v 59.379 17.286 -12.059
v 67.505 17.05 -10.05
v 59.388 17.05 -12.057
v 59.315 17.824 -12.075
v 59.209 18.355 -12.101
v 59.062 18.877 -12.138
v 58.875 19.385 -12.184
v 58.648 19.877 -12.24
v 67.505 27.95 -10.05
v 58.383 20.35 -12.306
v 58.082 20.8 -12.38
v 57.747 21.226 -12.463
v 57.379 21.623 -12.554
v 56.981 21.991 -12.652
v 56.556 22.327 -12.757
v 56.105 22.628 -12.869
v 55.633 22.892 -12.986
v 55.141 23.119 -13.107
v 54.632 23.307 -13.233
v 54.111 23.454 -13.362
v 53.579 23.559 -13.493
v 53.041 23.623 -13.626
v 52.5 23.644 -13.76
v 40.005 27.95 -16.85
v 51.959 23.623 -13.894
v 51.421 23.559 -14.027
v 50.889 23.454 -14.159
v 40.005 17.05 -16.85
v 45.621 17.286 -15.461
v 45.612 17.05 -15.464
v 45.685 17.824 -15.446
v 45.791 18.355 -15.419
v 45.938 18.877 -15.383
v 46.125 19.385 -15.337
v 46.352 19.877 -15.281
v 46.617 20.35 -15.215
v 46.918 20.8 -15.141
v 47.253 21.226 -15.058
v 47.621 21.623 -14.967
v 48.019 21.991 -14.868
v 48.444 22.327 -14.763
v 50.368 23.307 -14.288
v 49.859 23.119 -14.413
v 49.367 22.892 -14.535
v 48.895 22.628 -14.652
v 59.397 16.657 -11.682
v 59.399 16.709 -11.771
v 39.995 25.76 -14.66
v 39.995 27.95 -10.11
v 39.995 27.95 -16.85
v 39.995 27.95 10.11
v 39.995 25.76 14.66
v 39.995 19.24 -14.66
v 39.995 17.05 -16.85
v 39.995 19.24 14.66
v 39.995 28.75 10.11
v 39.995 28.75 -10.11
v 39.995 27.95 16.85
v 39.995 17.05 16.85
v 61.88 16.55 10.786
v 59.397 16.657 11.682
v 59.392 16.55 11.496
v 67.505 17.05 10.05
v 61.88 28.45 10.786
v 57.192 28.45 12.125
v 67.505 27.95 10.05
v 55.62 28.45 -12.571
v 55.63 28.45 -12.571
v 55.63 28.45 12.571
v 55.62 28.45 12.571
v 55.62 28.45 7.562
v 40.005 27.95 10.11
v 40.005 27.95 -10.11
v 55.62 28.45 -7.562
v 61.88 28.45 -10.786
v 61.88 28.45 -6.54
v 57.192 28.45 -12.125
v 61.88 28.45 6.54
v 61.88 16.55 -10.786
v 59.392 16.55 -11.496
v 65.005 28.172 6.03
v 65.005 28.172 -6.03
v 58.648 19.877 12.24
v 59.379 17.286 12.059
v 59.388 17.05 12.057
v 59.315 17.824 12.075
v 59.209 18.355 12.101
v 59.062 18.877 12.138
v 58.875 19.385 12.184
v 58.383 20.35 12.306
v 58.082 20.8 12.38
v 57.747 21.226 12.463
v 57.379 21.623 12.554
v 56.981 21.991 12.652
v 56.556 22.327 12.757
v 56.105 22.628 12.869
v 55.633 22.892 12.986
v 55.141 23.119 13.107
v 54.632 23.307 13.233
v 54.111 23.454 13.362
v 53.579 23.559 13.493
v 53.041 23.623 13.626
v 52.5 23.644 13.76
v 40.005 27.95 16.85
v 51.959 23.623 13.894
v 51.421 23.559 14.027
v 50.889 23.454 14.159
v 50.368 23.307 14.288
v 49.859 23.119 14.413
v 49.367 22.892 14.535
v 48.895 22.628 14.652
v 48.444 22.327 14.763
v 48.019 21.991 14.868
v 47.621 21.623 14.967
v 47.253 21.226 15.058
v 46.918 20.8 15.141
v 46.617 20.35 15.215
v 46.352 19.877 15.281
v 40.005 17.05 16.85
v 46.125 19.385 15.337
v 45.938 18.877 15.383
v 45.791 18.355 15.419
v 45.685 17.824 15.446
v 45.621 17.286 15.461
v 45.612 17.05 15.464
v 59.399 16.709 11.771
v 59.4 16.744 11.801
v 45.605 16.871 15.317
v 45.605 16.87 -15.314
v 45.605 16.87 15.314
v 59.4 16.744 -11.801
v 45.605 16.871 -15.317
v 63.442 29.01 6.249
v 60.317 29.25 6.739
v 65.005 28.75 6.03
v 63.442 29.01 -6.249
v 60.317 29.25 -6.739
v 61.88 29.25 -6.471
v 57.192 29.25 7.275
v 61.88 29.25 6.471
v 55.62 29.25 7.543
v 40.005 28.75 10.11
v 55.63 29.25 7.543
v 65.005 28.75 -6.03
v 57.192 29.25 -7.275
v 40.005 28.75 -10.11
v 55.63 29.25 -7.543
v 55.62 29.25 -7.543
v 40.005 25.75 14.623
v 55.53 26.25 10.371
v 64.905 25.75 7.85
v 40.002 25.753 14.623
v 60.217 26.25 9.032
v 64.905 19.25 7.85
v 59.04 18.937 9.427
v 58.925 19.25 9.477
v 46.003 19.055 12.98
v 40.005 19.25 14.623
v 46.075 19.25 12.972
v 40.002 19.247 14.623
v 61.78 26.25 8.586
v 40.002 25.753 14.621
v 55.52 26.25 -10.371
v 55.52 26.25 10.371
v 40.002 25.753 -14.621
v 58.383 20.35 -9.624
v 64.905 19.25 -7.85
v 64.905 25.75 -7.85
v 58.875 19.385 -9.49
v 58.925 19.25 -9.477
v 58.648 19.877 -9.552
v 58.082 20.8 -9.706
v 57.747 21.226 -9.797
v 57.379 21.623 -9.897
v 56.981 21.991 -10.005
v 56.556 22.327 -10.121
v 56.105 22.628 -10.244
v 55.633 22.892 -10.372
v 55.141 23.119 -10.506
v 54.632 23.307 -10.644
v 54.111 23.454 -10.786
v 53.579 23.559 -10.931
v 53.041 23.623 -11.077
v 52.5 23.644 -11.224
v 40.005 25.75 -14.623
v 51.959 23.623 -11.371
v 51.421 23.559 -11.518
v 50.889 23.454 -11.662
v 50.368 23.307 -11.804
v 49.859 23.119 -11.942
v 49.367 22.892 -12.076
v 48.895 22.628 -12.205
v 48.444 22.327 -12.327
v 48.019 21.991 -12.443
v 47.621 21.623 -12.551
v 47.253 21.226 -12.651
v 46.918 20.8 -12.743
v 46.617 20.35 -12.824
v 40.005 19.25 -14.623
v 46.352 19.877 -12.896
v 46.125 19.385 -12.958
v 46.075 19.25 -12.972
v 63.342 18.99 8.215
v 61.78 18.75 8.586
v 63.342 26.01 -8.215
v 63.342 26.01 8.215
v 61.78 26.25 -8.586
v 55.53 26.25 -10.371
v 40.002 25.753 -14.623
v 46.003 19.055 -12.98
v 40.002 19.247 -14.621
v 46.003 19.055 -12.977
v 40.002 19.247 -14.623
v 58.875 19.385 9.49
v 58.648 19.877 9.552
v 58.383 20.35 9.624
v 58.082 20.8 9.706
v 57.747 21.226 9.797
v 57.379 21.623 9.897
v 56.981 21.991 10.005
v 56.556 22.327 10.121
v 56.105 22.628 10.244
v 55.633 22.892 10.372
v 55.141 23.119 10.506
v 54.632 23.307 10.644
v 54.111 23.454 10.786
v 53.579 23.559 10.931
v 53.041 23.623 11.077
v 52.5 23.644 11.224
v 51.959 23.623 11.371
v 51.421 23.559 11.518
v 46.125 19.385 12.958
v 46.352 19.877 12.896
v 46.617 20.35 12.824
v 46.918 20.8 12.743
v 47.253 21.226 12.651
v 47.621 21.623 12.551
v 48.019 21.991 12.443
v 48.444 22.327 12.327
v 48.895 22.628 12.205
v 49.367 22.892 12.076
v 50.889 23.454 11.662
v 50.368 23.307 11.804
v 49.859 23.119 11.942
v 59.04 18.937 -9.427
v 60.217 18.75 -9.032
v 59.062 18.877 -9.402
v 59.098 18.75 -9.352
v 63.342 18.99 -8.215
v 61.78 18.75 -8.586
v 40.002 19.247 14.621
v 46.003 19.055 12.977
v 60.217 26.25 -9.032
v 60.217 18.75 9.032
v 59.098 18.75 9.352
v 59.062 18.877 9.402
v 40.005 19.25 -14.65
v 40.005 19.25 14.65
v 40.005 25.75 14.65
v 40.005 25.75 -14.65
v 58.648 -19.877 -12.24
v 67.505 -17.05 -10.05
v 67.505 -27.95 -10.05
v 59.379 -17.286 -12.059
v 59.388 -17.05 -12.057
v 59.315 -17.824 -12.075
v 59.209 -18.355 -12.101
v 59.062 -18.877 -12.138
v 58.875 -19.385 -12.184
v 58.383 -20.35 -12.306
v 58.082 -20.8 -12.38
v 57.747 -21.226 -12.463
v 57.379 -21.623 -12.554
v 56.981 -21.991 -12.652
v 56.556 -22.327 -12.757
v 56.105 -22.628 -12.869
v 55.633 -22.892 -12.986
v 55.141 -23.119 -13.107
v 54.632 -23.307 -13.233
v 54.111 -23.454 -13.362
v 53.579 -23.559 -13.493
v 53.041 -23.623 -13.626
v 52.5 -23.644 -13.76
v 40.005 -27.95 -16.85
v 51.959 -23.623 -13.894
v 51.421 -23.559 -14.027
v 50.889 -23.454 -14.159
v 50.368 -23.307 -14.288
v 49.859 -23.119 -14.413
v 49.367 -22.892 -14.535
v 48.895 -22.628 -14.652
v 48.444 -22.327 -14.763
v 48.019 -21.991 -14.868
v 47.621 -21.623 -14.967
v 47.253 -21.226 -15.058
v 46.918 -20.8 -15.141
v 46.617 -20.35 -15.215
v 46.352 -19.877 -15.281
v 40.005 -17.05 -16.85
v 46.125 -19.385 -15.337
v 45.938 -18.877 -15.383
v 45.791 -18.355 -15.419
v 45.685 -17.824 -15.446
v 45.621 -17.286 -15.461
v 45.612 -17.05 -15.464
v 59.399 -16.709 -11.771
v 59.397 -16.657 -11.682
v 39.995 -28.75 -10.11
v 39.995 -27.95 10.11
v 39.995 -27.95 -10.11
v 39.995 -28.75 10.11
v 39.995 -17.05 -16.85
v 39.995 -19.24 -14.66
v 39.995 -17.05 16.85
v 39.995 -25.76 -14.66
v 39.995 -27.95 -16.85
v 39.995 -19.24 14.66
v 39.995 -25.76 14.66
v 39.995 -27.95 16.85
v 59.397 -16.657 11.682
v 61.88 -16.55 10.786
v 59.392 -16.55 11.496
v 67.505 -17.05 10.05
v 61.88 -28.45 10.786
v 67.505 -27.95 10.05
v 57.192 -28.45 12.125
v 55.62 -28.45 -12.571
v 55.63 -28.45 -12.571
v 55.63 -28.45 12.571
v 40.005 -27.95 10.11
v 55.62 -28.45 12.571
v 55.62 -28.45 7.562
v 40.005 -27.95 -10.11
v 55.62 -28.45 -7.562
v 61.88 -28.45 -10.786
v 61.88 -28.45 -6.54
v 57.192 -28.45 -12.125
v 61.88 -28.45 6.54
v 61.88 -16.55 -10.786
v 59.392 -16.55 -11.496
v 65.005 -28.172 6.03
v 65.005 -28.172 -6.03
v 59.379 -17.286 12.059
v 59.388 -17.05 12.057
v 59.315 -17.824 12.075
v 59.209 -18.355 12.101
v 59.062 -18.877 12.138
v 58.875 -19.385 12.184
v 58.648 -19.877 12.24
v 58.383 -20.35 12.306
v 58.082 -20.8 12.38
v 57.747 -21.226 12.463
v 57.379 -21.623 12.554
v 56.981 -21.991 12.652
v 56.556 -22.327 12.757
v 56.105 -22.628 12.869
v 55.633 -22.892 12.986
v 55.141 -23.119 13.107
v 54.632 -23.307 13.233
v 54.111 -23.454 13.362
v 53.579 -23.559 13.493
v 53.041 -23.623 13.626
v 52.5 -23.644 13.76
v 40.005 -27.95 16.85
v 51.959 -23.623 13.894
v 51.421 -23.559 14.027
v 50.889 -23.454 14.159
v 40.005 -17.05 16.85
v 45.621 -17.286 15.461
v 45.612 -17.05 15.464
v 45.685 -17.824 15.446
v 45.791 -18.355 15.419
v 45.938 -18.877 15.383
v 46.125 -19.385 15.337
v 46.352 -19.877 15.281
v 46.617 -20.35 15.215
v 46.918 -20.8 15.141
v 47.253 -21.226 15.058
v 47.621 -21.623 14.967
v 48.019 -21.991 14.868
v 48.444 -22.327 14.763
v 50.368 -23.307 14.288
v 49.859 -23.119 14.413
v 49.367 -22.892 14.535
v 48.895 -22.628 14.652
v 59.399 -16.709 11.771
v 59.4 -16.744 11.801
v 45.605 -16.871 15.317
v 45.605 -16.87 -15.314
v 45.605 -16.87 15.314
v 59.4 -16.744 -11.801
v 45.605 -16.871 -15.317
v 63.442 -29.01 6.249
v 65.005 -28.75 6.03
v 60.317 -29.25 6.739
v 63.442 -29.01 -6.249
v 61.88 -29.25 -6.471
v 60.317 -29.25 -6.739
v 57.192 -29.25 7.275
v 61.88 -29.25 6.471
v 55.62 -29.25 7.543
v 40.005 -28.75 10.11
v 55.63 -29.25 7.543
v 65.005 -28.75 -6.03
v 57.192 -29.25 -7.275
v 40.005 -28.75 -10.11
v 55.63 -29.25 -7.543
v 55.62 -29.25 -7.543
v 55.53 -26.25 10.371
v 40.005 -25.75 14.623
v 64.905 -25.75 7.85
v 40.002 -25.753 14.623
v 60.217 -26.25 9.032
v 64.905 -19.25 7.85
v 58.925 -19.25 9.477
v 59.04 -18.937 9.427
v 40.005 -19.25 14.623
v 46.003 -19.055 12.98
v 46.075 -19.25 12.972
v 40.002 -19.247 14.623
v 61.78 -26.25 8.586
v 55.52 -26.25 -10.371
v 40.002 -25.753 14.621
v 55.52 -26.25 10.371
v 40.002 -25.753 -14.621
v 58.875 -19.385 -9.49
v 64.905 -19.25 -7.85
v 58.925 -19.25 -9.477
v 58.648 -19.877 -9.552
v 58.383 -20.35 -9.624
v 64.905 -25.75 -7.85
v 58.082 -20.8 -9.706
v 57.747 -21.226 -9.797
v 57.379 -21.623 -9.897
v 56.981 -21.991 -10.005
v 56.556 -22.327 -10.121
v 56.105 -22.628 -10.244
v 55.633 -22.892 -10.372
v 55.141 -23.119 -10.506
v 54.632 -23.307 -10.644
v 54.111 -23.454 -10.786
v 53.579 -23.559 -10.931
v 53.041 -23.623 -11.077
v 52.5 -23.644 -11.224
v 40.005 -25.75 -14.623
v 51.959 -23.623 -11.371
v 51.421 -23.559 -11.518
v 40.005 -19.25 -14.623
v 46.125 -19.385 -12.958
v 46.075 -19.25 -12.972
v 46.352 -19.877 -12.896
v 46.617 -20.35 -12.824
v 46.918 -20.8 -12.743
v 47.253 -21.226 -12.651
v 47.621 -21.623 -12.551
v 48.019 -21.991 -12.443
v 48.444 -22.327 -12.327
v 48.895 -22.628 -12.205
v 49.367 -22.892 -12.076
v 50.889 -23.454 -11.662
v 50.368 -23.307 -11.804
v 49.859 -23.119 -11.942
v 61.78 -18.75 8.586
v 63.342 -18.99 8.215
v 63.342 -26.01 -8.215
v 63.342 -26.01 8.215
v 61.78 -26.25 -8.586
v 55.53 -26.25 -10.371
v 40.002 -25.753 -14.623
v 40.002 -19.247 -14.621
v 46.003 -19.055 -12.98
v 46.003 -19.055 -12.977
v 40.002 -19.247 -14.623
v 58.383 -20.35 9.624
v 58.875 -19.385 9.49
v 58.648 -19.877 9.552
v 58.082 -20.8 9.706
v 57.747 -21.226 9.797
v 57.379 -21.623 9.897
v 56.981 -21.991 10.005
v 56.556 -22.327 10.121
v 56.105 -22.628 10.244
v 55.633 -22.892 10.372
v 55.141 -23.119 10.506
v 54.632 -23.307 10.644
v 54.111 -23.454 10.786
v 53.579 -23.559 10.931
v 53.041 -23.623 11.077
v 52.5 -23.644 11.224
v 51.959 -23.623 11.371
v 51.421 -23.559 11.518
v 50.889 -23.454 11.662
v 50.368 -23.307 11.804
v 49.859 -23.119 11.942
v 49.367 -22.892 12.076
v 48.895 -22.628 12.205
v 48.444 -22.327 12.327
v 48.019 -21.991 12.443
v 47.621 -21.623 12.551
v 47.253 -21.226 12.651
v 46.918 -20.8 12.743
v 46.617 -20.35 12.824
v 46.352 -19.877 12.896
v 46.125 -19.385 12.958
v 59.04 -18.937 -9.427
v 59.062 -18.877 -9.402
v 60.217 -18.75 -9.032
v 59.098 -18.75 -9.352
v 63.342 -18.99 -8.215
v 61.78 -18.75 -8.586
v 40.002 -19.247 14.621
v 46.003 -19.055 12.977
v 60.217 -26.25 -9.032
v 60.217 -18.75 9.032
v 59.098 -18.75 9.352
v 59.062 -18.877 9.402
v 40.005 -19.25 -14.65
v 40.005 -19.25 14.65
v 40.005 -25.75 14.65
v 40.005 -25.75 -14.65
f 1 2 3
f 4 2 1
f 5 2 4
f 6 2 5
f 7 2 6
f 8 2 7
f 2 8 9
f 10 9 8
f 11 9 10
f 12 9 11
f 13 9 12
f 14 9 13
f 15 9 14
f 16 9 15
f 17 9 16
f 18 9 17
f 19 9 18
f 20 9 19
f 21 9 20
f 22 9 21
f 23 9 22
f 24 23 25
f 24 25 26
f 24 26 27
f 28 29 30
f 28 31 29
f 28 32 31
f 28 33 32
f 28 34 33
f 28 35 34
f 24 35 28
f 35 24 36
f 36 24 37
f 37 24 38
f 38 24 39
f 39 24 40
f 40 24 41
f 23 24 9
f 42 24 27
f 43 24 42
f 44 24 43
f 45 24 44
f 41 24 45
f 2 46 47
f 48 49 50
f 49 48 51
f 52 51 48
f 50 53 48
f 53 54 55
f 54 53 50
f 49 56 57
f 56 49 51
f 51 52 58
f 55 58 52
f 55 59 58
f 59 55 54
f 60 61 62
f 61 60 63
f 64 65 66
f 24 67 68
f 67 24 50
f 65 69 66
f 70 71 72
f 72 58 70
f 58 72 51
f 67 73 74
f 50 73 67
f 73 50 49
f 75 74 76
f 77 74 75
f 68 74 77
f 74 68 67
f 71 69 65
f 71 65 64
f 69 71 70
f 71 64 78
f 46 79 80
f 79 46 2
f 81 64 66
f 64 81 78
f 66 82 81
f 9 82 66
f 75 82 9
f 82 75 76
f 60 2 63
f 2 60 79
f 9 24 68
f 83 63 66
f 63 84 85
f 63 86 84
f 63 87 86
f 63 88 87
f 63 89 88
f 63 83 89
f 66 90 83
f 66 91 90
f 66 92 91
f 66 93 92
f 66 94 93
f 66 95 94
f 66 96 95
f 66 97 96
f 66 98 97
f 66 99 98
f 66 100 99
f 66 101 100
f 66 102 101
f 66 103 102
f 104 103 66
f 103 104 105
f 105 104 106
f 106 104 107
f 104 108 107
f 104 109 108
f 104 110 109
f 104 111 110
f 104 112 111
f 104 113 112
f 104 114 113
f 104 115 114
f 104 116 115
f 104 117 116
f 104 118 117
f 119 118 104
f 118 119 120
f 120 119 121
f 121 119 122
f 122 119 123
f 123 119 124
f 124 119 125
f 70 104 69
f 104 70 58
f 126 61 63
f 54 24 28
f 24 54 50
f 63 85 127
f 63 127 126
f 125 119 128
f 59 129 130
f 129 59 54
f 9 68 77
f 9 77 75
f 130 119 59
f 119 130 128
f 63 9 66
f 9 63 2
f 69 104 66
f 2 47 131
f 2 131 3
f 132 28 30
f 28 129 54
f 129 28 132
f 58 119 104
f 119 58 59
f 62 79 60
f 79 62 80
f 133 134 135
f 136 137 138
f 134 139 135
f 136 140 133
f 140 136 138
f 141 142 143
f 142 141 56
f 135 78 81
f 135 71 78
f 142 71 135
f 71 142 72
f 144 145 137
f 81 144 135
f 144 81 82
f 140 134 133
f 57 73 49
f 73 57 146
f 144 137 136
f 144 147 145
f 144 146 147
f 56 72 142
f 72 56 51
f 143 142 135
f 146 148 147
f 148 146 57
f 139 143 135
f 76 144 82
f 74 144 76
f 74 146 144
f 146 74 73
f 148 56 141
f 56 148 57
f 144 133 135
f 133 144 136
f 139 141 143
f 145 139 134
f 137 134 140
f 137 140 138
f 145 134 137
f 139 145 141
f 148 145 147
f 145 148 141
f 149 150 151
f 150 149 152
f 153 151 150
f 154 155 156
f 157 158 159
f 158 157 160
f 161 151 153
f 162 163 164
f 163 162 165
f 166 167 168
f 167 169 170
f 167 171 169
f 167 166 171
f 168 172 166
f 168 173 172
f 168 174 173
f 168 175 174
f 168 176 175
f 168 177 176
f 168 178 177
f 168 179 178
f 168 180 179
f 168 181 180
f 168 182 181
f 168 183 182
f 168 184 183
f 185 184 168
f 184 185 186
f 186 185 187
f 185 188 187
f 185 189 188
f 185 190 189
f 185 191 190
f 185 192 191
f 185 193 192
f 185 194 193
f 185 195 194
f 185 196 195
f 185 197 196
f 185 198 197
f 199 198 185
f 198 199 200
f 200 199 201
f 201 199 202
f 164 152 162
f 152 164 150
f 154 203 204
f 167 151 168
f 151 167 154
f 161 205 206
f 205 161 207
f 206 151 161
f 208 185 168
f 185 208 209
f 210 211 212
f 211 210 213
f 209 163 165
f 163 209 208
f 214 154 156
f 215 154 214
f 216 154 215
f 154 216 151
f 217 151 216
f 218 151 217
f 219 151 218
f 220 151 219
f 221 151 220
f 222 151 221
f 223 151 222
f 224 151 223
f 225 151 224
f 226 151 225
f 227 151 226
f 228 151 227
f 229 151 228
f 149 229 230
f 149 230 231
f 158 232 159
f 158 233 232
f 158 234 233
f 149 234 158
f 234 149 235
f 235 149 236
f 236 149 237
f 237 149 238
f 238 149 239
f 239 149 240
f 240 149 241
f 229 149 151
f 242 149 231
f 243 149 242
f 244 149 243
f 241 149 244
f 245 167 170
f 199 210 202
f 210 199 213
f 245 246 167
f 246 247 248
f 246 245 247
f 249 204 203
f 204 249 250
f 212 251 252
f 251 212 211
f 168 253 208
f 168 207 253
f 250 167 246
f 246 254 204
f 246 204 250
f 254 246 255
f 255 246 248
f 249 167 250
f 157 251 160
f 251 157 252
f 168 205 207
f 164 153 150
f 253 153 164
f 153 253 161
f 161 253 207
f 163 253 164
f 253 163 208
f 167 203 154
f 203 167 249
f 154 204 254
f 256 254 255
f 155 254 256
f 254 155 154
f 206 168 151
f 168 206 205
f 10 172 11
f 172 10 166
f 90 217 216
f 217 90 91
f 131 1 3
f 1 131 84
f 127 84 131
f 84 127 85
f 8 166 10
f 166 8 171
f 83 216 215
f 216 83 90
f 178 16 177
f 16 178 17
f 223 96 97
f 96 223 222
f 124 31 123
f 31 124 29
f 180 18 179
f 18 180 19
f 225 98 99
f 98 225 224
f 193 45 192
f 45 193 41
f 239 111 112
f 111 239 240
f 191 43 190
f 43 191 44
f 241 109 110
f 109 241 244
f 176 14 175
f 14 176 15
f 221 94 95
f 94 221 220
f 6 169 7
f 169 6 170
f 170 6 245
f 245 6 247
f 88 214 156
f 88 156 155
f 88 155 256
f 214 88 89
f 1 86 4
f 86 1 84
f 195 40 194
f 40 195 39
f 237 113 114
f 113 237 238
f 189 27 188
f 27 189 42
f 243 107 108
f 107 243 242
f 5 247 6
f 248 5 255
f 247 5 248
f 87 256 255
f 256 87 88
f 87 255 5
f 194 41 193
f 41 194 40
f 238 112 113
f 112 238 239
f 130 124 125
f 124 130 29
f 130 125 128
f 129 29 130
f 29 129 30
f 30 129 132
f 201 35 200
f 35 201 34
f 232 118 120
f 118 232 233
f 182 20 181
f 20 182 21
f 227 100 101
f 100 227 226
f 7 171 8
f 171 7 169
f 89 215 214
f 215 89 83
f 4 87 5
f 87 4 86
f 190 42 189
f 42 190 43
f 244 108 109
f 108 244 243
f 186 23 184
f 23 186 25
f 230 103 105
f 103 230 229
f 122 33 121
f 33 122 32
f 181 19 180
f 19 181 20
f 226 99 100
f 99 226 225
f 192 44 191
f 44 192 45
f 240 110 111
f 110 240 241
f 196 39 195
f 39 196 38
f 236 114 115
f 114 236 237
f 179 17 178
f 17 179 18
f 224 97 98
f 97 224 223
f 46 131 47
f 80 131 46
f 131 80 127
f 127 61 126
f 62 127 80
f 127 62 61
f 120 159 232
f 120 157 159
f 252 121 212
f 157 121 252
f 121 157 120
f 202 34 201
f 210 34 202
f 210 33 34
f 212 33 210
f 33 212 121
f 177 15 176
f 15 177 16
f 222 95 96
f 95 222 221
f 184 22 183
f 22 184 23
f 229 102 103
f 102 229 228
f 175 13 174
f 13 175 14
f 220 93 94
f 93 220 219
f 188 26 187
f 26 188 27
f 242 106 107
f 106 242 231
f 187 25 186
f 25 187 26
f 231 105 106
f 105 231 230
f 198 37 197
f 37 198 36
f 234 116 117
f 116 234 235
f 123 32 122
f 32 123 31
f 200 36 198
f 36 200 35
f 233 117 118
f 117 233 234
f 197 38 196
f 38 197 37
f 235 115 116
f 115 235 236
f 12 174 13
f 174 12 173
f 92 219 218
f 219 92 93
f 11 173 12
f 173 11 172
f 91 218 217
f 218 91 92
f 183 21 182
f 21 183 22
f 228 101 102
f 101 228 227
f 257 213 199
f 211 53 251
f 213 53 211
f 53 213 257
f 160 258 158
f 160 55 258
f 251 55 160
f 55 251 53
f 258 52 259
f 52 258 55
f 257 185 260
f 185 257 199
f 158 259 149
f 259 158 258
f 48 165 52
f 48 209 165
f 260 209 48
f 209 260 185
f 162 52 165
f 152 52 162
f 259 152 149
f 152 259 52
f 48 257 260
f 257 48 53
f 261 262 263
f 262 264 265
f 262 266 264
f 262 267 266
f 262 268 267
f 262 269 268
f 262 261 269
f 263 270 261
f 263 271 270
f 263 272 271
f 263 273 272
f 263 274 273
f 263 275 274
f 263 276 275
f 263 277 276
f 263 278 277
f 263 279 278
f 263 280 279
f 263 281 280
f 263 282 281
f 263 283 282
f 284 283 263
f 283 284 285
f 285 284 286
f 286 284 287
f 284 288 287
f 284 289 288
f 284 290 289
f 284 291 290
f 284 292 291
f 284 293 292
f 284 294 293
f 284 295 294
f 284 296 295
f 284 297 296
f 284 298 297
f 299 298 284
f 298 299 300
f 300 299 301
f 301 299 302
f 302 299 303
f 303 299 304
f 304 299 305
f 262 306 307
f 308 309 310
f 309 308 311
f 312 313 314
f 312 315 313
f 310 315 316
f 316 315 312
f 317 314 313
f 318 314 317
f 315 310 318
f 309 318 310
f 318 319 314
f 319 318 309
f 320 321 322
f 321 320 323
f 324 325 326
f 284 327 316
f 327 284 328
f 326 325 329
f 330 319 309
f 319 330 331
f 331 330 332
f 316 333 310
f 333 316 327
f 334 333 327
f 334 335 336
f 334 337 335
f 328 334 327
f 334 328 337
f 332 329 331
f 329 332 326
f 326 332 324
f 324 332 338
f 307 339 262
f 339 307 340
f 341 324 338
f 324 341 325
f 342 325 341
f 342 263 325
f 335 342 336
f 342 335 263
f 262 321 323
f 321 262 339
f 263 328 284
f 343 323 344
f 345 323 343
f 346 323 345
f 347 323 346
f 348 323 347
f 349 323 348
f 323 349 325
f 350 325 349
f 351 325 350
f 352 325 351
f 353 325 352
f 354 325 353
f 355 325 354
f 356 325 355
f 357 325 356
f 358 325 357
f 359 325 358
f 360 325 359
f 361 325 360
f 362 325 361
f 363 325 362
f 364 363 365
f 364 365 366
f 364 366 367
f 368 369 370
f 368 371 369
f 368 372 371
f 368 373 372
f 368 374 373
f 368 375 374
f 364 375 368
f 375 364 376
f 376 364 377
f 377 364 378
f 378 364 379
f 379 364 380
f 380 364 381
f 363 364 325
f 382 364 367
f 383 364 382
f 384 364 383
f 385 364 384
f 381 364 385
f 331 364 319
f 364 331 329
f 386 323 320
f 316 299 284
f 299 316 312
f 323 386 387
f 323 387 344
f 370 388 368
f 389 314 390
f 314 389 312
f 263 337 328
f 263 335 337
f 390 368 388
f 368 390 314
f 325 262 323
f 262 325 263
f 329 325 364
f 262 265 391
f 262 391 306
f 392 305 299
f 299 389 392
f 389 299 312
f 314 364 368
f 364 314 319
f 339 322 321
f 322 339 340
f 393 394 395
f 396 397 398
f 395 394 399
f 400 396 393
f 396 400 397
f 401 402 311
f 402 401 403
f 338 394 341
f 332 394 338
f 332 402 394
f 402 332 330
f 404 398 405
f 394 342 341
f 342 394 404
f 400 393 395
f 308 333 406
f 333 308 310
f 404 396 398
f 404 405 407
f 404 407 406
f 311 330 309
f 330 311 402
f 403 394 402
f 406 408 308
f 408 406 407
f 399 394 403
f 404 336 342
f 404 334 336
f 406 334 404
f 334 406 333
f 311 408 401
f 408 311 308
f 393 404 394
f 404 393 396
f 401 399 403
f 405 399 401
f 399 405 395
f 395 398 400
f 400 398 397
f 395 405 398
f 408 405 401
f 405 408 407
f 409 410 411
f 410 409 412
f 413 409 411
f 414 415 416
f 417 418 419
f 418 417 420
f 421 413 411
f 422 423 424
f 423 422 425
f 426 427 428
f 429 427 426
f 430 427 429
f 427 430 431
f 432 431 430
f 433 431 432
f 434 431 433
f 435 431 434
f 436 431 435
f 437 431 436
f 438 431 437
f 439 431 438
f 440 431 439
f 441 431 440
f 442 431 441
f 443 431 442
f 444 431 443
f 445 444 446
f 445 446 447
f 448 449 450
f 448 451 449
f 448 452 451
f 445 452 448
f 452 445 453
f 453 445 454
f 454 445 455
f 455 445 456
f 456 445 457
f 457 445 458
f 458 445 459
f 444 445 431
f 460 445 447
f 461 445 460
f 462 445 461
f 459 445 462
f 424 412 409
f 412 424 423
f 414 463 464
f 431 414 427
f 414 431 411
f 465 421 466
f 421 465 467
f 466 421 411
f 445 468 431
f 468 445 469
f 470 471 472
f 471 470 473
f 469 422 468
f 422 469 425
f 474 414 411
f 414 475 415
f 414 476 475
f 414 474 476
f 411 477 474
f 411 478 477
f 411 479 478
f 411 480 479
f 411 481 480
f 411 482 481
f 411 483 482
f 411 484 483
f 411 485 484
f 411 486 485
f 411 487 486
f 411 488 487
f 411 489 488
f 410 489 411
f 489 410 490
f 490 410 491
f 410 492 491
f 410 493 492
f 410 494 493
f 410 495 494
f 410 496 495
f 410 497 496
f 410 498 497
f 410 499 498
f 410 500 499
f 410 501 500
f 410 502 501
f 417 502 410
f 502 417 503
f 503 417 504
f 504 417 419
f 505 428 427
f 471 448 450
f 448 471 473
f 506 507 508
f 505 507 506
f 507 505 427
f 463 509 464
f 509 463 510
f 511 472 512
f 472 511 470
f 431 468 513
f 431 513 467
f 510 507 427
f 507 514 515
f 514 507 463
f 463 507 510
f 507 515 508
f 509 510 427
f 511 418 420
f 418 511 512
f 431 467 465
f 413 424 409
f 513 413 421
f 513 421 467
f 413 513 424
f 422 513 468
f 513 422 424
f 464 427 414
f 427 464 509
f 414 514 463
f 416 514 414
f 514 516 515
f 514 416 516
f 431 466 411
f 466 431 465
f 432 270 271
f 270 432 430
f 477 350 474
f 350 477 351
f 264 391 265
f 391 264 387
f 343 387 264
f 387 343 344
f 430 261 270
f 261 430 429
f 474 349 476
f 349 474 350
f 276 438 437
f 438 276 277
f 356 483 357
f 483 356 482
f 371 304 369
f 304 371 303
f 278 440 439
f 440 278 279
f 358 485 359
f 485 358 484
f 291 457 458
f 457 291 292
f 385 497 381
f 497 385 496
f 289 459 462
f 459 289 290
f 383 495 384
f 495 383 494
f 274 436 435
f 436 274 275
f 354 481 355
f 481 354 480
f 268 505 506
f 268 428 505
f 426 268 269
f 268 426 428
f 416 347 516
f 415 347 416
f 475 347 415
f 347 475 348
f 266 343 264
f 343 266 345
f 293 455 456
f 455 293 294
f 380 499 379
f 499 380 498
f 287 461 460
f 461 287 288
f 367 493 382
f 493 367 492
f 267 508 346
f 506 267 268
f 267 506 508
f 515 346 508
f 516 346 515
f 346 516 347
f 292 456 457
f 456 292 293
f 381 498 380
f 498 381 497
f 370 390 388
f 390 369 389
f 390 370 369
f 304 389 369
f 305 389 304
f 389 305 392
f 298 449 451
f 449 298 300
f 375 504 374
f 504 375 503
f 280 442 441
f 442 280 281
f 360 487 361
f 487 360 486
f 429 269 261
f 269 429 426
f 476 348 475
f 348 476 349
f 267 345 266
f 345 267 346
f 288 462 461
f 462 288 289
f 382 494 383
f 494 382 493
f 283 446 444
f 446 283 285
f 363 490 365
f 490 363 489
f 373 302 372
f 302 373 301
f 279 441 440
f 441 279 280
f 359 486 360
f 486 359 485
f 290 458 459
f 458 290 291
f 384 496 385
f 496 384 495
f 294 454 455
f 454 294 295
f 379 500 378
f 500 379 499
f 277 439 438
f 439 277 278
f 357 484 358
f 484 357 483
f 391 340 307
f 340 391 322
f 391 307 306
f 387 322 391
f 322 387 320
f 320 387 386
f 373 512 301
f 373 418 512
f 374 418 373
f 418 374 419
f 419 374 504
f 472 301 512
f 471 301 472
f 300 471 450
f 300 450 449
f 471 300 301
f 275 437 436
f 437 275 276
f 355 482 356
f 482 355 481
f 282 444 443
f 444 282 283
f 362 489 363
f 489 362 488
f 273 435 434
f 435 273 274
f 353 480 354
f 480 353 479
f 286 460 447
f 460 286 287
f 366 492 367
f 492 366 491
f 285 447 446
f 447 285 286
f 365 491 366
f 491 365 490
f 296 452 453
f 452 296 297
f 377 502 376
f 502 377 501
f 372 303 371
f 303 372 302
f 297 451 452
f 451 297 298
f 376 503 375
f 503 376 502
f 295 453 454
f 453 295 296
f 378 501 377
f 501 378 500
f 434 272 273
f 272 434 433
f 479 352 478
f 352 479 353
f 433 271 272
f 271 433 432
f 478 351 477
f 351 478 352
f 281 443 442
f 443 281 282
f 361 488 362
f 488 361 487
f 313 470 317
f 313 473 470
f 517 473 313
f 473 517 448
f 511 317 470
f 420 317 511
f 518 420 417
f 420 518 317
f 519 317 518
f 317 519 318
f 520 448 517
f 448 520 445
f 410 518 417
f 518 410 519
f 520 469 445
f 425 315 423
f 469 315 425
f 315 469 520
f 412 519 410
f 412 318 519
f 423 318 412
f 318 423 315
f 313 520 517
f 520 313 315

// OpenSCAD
// ============================================================
//  OMX_F Gripper — Tube-Grip Tip Insert
//  Target: 13 mm OD glass test tube held VERTICALLY (tube axis = Z)
//  Zone  : blade X = 40 → 65 mm (finger-local frame)
//  Print : TPU 95A recommended (glass-safe, high friction)
//
//  Retention strategy (top-view layout along finger length)
//  ────────────────────────────────────────────────────────
//   X=40 ─── 45.6 ──── 59.4 ─── 65 ── 67.5
//   |  GRIP  |  CRADLE  |  GRIP  |CAP|
//    (-X wrap   (-Y cut    (+X wrap  (closed
//     full      for tube)   full)    tip past
//     blade)                          blade)
//
//   • GRIP zones: insert wraps blade on all 4 sides (Y±, Z±) →
//     friction fit + clip_lip on +Y face holds insert on blade.
//   • CAP: solid material past blade tip stops insert from sliding
//     off in +X direction. Blade tip butts against inside of cap.
//   • CRADLE: cylindrical cut (axis ‖ Z) on -Y face for vertical
//     tube. Two fingers' bites combine into full circle when closed.
//   • Mirrored in Y for link7 (inner face = +Y).
// ============================================================

// ── USER PARAMETERS ─────────────────────────────────────────

tube_od       = 13.0;   // target tube outer diameter (mm)
tube_clear    = 0.4;    // gap between tube and cradle (mm)
clearance     = 0.25;   // blade fit clearance (mm) — reduce if loose
wall          = 2.2;    // min wall around blade (mm)
clip_lip      = 0.8;    // snap-fit undercut depth on outer Y face (mm)
cap_thick     = 2.5;    // closed tip cap past blade tip (mm) — +X retention
cradle_x_frac = 0.5;    // tube center along insert X: 0=start, 1=end (0.5=mid)
cradle_sink   = 0.0;    // mm to recess tube center into +Y past inner face
                        //   0 = exact half-cylinder cut (cradle = half tube)
                        //   >0 = deeper bite (more grip, less Y material)
show_phantom  = false;  // show translucent blade for alignment check
which_finger  = "both"; // "link6" | "link7" | "both"

// ── BLADE CROSS-SECTION TABLE (X=40..65 zone) ───────────────
//   [ X, half_Y, half_Z ]  — measured via trimesh.section()
blade_pts = [
    [ 40, 3.0, 14.4 ],
    [ 46, 2.8, 12.7 ],
    [ 55, 3.5, 10.3 ],
    [ 62, 3.5,  8.3 ],
    [ 65, 3.0,  7.6 ],
];

X_START = 40;
X_END   = 65;
INS_LEN = X_END - X_START;  // 25 mm

// ── DERIVED ──────────────────────────────────────────────────
tube_r   = tube_od / 2;
cradle_r = tube_r + tube_clear;          // cradle radius (cut)
X_CTR    = X_START + cradle_x_frac * INS_LEN;

// ── HELPERS ──────────────────────────────────────────────────
function lerp(a, b, t) = a + (b-a)*t;

// Find segment index i s.t. blade_pts[i].x <= x < blade_pts[i+1].x
function seg(x, i=0) =
    (i >= len(blade_pts)-2) ? i :
    (x <= blade_pts[i+1][0]) ? i : seg(x, i+1);

function bhy(x) =
    let(i = seg(x), x0 = blade_pts[i][0], x1 = blade_pts[i+1][0])
    lerp(blade_pts[i][1], blade_pts[i+1][1], (x-x0)/(x1-x0));

function bhz(x) =
    let(i = seg(x), x0 = blade_pts[i][0], x1 = blade_pts[i+1][0])
    lerp(blade_pts[i][2], blade_pts[i+1][2], (x-x0)/(x1-x0));

N = 16;  // hull slices

// ── MODULES ──────────────────────────────────────────────────

// Outer body: blade envelope + wall, extended past tip by cap_thick.
// Cavity stops at X_END → x=X_END..X_END+cap_thick is solid (tip cap).
module insert_outer() {
    hull() {
        for (i = [0:N]) {
            x = X_START + i * INS_LEN / N;
            hy = bhy(x) + wall + clearance;
            hz = bhz(x) + wall + clearance;
            translate([x, 0, 0])
                cube([0.01, hy*2, hz*2], center=true);
        }
        // Tip cap slice (same Y/Z dims as X_END)
        hy_end = bhy(X_END) + wall + clearance;
        hz_end = bhz(X_END) + wall + clearance;
        translate([X_END + cap_thick, 0, 0])
            cube([0.01, hy_end*2, hz_end*2], center=true);
    }
}

// Blade cavity (blade shape + clearance)
module blade_cavity() {
    // Full pass-through cavity — open at X_START end for sliding
    translate([-0.1, 0, 0])   // extend slightly past start
    hull()
        for (i = [0:N]) {
            x = X_START + i * INS_LEN / N;
            hy = bhy(x) + clearance;
            hz = bhz(x) + clearance;
            translate([x, 0, 0])
                cube([0.01, hy*2, hz*2], center=true);
        }
}

// Cylindrical tube cradle — axis ‖ Z (vertical tube).
// Cut center sits on (or sinks past) the inner -Y face; the cylinder
// removes a half-circle bite from the insert in the XY plane. The two
// fingers' bites combine into a full cylinder when the gripper closes.
module tube_cradle() {
    face_y = -(bhy(X_CTR) + wall + clearance);   // inner -Y face at X_CTR
    cy     = face_y + cradle_sink;               // tube axis Y
    // height: full Z extent of insert + margin (cuts through top/bottom)
    h_z = max(bhz(X_START), bhz(X_END)) * 2 + 2*wall + 4*clearance + 10;
    translate([X_CTR, cy, 0])
        cylinder(r = cradle_r, h = h_z, center = true, $fn = 80);
}

// Snap-fit clip lip on outer +Y face (keeps insert from sliding off blade)
module clip_lip() {
    hull()
        for (i = [0:N]) {
            x = X_START + i * INS_LEN / N;
            hy_out = bhy(x) + wall + clearance;
            hz_out = bhz(x) + wall + clearance;
            translate([x, hy_out, 0])
                cube([0.01, clip_lip*2, hz_out*1.2], center=true);
        }
}

// Phantom blade for visual alignment check
module blade_phantom() {
    color("cyan", 0.2)
    hull()
        for (i = [0:N]) {
            x = X_START + i * INS_LEN / N;
            translate([x, 0, 0])
                cube([0.01, bhy(x)*2, bhz(x)*2], center=true);
        }
}

// Entry lead-in: chamfer the open end (X_START side) so blade slides in
module entry_chamfer() {
    ch = 1.5;  // chamfer size
    hull() {
        // Normal profile at X_START
        translate([X_START, 0, 0]) {
            hy = bhy(X_START) + clearance;
            hz = bhz(X_START) + clearance;
            cube([0.01, hy*2, hz*2], center=true);
        }
        // Enlarged profile slightly before X_START
        translate([X_START - ch, 0, 0]) {
            hy = bhy(X_START) + clearance + ch;
            hz = bhz(X_START) + clearance + ch;
            cube([0.01, hy*2, hz*2], center=true);
        }
    }
}

// Complete insert for link6 (inner = -Y)
module insert_link6() {
    difference() {
        union() {
            insert_outer();
            clip_lip();         // snap ridge on outer +Y
        }
        blade_cavity();
        tube_cradle();      // half-cylinder cut for vertical tube on -Y face
        entry_chamfer();
    }
    if (show_phantom) blade_phantom();
}

// Complete insert for link7 (inner = +Y, mirror of link6)
module insert_link7() {
    scale([1, -1, 1])
        insert_link6();
}

// ── RENDER ───────────────────────────────────────────────────
SEP = 45;  // Y separation when showing both

if (which_finger == "link6") {
    insert_link6();
} else if (which_finger == "link7") {
    insert_link7();
} else {
    translate([0,  SEP/2, 0]) insert_link6();
    translate([0, -SEP/2, 0]) insert_link7();
}

// ============================================================
//  PRINT GUIDE
// ─────────────────────────────────────────────────────────────
//  Material  : TPU 95A  (Shore hardness gives compliance +
//              grip on glass; PLA/PETG alternative if no TPU)
//  Orientation: stand on +X end — Z axis vertical = cradle axis vertical
//              (avoids supports inside the cradle arc).
//  Layer h   : 0.15 mm for smooth cradle surface
//  Walls     : 3 perimeters (no infill needed — solid is fine
//              for such a small part)
//  Supports  : none needed
//
//  FIT TUNING
//  ──────────
//  Too loose on blade → decrease clearance (try 0.15)
//  Too tight          → increase clearance (try 0.35)
//  Clip doesn't snap  → increase clip_lip (try 1.2)
//
//  TUBE CRADLE GEOMETRY (13 mm tube, vertical = Z axis)
//  ─────────────────────────────────────────────────────
//  cradle radius      : 6.5 + tube_clear mm
//  cradle axis        : Z (tube vertical)
//  cradle center X    : X_START + cradle_x_frac * INS_LEN  (default mid)
//  bite shape         : half-cylinder cut into inner Y face
//  → two fingers' bites = full circle around tube when closed
//  → tube extends vertically through the open ends in Z
//
//  GEOMETRY CONSTRAINT
//  ───────────────────
//  Tube radius (6.5 mm) > finger half-Y at tip (~3 mm), so the cradle
//  cuts past the finger centerline in Y. This is expected: the cradle
//  is shared between both fingers when closed. The +Y wall remains
//  ~(half_Z + wall - cradle_r) thick — verify visually before printing.
// ============================================================
